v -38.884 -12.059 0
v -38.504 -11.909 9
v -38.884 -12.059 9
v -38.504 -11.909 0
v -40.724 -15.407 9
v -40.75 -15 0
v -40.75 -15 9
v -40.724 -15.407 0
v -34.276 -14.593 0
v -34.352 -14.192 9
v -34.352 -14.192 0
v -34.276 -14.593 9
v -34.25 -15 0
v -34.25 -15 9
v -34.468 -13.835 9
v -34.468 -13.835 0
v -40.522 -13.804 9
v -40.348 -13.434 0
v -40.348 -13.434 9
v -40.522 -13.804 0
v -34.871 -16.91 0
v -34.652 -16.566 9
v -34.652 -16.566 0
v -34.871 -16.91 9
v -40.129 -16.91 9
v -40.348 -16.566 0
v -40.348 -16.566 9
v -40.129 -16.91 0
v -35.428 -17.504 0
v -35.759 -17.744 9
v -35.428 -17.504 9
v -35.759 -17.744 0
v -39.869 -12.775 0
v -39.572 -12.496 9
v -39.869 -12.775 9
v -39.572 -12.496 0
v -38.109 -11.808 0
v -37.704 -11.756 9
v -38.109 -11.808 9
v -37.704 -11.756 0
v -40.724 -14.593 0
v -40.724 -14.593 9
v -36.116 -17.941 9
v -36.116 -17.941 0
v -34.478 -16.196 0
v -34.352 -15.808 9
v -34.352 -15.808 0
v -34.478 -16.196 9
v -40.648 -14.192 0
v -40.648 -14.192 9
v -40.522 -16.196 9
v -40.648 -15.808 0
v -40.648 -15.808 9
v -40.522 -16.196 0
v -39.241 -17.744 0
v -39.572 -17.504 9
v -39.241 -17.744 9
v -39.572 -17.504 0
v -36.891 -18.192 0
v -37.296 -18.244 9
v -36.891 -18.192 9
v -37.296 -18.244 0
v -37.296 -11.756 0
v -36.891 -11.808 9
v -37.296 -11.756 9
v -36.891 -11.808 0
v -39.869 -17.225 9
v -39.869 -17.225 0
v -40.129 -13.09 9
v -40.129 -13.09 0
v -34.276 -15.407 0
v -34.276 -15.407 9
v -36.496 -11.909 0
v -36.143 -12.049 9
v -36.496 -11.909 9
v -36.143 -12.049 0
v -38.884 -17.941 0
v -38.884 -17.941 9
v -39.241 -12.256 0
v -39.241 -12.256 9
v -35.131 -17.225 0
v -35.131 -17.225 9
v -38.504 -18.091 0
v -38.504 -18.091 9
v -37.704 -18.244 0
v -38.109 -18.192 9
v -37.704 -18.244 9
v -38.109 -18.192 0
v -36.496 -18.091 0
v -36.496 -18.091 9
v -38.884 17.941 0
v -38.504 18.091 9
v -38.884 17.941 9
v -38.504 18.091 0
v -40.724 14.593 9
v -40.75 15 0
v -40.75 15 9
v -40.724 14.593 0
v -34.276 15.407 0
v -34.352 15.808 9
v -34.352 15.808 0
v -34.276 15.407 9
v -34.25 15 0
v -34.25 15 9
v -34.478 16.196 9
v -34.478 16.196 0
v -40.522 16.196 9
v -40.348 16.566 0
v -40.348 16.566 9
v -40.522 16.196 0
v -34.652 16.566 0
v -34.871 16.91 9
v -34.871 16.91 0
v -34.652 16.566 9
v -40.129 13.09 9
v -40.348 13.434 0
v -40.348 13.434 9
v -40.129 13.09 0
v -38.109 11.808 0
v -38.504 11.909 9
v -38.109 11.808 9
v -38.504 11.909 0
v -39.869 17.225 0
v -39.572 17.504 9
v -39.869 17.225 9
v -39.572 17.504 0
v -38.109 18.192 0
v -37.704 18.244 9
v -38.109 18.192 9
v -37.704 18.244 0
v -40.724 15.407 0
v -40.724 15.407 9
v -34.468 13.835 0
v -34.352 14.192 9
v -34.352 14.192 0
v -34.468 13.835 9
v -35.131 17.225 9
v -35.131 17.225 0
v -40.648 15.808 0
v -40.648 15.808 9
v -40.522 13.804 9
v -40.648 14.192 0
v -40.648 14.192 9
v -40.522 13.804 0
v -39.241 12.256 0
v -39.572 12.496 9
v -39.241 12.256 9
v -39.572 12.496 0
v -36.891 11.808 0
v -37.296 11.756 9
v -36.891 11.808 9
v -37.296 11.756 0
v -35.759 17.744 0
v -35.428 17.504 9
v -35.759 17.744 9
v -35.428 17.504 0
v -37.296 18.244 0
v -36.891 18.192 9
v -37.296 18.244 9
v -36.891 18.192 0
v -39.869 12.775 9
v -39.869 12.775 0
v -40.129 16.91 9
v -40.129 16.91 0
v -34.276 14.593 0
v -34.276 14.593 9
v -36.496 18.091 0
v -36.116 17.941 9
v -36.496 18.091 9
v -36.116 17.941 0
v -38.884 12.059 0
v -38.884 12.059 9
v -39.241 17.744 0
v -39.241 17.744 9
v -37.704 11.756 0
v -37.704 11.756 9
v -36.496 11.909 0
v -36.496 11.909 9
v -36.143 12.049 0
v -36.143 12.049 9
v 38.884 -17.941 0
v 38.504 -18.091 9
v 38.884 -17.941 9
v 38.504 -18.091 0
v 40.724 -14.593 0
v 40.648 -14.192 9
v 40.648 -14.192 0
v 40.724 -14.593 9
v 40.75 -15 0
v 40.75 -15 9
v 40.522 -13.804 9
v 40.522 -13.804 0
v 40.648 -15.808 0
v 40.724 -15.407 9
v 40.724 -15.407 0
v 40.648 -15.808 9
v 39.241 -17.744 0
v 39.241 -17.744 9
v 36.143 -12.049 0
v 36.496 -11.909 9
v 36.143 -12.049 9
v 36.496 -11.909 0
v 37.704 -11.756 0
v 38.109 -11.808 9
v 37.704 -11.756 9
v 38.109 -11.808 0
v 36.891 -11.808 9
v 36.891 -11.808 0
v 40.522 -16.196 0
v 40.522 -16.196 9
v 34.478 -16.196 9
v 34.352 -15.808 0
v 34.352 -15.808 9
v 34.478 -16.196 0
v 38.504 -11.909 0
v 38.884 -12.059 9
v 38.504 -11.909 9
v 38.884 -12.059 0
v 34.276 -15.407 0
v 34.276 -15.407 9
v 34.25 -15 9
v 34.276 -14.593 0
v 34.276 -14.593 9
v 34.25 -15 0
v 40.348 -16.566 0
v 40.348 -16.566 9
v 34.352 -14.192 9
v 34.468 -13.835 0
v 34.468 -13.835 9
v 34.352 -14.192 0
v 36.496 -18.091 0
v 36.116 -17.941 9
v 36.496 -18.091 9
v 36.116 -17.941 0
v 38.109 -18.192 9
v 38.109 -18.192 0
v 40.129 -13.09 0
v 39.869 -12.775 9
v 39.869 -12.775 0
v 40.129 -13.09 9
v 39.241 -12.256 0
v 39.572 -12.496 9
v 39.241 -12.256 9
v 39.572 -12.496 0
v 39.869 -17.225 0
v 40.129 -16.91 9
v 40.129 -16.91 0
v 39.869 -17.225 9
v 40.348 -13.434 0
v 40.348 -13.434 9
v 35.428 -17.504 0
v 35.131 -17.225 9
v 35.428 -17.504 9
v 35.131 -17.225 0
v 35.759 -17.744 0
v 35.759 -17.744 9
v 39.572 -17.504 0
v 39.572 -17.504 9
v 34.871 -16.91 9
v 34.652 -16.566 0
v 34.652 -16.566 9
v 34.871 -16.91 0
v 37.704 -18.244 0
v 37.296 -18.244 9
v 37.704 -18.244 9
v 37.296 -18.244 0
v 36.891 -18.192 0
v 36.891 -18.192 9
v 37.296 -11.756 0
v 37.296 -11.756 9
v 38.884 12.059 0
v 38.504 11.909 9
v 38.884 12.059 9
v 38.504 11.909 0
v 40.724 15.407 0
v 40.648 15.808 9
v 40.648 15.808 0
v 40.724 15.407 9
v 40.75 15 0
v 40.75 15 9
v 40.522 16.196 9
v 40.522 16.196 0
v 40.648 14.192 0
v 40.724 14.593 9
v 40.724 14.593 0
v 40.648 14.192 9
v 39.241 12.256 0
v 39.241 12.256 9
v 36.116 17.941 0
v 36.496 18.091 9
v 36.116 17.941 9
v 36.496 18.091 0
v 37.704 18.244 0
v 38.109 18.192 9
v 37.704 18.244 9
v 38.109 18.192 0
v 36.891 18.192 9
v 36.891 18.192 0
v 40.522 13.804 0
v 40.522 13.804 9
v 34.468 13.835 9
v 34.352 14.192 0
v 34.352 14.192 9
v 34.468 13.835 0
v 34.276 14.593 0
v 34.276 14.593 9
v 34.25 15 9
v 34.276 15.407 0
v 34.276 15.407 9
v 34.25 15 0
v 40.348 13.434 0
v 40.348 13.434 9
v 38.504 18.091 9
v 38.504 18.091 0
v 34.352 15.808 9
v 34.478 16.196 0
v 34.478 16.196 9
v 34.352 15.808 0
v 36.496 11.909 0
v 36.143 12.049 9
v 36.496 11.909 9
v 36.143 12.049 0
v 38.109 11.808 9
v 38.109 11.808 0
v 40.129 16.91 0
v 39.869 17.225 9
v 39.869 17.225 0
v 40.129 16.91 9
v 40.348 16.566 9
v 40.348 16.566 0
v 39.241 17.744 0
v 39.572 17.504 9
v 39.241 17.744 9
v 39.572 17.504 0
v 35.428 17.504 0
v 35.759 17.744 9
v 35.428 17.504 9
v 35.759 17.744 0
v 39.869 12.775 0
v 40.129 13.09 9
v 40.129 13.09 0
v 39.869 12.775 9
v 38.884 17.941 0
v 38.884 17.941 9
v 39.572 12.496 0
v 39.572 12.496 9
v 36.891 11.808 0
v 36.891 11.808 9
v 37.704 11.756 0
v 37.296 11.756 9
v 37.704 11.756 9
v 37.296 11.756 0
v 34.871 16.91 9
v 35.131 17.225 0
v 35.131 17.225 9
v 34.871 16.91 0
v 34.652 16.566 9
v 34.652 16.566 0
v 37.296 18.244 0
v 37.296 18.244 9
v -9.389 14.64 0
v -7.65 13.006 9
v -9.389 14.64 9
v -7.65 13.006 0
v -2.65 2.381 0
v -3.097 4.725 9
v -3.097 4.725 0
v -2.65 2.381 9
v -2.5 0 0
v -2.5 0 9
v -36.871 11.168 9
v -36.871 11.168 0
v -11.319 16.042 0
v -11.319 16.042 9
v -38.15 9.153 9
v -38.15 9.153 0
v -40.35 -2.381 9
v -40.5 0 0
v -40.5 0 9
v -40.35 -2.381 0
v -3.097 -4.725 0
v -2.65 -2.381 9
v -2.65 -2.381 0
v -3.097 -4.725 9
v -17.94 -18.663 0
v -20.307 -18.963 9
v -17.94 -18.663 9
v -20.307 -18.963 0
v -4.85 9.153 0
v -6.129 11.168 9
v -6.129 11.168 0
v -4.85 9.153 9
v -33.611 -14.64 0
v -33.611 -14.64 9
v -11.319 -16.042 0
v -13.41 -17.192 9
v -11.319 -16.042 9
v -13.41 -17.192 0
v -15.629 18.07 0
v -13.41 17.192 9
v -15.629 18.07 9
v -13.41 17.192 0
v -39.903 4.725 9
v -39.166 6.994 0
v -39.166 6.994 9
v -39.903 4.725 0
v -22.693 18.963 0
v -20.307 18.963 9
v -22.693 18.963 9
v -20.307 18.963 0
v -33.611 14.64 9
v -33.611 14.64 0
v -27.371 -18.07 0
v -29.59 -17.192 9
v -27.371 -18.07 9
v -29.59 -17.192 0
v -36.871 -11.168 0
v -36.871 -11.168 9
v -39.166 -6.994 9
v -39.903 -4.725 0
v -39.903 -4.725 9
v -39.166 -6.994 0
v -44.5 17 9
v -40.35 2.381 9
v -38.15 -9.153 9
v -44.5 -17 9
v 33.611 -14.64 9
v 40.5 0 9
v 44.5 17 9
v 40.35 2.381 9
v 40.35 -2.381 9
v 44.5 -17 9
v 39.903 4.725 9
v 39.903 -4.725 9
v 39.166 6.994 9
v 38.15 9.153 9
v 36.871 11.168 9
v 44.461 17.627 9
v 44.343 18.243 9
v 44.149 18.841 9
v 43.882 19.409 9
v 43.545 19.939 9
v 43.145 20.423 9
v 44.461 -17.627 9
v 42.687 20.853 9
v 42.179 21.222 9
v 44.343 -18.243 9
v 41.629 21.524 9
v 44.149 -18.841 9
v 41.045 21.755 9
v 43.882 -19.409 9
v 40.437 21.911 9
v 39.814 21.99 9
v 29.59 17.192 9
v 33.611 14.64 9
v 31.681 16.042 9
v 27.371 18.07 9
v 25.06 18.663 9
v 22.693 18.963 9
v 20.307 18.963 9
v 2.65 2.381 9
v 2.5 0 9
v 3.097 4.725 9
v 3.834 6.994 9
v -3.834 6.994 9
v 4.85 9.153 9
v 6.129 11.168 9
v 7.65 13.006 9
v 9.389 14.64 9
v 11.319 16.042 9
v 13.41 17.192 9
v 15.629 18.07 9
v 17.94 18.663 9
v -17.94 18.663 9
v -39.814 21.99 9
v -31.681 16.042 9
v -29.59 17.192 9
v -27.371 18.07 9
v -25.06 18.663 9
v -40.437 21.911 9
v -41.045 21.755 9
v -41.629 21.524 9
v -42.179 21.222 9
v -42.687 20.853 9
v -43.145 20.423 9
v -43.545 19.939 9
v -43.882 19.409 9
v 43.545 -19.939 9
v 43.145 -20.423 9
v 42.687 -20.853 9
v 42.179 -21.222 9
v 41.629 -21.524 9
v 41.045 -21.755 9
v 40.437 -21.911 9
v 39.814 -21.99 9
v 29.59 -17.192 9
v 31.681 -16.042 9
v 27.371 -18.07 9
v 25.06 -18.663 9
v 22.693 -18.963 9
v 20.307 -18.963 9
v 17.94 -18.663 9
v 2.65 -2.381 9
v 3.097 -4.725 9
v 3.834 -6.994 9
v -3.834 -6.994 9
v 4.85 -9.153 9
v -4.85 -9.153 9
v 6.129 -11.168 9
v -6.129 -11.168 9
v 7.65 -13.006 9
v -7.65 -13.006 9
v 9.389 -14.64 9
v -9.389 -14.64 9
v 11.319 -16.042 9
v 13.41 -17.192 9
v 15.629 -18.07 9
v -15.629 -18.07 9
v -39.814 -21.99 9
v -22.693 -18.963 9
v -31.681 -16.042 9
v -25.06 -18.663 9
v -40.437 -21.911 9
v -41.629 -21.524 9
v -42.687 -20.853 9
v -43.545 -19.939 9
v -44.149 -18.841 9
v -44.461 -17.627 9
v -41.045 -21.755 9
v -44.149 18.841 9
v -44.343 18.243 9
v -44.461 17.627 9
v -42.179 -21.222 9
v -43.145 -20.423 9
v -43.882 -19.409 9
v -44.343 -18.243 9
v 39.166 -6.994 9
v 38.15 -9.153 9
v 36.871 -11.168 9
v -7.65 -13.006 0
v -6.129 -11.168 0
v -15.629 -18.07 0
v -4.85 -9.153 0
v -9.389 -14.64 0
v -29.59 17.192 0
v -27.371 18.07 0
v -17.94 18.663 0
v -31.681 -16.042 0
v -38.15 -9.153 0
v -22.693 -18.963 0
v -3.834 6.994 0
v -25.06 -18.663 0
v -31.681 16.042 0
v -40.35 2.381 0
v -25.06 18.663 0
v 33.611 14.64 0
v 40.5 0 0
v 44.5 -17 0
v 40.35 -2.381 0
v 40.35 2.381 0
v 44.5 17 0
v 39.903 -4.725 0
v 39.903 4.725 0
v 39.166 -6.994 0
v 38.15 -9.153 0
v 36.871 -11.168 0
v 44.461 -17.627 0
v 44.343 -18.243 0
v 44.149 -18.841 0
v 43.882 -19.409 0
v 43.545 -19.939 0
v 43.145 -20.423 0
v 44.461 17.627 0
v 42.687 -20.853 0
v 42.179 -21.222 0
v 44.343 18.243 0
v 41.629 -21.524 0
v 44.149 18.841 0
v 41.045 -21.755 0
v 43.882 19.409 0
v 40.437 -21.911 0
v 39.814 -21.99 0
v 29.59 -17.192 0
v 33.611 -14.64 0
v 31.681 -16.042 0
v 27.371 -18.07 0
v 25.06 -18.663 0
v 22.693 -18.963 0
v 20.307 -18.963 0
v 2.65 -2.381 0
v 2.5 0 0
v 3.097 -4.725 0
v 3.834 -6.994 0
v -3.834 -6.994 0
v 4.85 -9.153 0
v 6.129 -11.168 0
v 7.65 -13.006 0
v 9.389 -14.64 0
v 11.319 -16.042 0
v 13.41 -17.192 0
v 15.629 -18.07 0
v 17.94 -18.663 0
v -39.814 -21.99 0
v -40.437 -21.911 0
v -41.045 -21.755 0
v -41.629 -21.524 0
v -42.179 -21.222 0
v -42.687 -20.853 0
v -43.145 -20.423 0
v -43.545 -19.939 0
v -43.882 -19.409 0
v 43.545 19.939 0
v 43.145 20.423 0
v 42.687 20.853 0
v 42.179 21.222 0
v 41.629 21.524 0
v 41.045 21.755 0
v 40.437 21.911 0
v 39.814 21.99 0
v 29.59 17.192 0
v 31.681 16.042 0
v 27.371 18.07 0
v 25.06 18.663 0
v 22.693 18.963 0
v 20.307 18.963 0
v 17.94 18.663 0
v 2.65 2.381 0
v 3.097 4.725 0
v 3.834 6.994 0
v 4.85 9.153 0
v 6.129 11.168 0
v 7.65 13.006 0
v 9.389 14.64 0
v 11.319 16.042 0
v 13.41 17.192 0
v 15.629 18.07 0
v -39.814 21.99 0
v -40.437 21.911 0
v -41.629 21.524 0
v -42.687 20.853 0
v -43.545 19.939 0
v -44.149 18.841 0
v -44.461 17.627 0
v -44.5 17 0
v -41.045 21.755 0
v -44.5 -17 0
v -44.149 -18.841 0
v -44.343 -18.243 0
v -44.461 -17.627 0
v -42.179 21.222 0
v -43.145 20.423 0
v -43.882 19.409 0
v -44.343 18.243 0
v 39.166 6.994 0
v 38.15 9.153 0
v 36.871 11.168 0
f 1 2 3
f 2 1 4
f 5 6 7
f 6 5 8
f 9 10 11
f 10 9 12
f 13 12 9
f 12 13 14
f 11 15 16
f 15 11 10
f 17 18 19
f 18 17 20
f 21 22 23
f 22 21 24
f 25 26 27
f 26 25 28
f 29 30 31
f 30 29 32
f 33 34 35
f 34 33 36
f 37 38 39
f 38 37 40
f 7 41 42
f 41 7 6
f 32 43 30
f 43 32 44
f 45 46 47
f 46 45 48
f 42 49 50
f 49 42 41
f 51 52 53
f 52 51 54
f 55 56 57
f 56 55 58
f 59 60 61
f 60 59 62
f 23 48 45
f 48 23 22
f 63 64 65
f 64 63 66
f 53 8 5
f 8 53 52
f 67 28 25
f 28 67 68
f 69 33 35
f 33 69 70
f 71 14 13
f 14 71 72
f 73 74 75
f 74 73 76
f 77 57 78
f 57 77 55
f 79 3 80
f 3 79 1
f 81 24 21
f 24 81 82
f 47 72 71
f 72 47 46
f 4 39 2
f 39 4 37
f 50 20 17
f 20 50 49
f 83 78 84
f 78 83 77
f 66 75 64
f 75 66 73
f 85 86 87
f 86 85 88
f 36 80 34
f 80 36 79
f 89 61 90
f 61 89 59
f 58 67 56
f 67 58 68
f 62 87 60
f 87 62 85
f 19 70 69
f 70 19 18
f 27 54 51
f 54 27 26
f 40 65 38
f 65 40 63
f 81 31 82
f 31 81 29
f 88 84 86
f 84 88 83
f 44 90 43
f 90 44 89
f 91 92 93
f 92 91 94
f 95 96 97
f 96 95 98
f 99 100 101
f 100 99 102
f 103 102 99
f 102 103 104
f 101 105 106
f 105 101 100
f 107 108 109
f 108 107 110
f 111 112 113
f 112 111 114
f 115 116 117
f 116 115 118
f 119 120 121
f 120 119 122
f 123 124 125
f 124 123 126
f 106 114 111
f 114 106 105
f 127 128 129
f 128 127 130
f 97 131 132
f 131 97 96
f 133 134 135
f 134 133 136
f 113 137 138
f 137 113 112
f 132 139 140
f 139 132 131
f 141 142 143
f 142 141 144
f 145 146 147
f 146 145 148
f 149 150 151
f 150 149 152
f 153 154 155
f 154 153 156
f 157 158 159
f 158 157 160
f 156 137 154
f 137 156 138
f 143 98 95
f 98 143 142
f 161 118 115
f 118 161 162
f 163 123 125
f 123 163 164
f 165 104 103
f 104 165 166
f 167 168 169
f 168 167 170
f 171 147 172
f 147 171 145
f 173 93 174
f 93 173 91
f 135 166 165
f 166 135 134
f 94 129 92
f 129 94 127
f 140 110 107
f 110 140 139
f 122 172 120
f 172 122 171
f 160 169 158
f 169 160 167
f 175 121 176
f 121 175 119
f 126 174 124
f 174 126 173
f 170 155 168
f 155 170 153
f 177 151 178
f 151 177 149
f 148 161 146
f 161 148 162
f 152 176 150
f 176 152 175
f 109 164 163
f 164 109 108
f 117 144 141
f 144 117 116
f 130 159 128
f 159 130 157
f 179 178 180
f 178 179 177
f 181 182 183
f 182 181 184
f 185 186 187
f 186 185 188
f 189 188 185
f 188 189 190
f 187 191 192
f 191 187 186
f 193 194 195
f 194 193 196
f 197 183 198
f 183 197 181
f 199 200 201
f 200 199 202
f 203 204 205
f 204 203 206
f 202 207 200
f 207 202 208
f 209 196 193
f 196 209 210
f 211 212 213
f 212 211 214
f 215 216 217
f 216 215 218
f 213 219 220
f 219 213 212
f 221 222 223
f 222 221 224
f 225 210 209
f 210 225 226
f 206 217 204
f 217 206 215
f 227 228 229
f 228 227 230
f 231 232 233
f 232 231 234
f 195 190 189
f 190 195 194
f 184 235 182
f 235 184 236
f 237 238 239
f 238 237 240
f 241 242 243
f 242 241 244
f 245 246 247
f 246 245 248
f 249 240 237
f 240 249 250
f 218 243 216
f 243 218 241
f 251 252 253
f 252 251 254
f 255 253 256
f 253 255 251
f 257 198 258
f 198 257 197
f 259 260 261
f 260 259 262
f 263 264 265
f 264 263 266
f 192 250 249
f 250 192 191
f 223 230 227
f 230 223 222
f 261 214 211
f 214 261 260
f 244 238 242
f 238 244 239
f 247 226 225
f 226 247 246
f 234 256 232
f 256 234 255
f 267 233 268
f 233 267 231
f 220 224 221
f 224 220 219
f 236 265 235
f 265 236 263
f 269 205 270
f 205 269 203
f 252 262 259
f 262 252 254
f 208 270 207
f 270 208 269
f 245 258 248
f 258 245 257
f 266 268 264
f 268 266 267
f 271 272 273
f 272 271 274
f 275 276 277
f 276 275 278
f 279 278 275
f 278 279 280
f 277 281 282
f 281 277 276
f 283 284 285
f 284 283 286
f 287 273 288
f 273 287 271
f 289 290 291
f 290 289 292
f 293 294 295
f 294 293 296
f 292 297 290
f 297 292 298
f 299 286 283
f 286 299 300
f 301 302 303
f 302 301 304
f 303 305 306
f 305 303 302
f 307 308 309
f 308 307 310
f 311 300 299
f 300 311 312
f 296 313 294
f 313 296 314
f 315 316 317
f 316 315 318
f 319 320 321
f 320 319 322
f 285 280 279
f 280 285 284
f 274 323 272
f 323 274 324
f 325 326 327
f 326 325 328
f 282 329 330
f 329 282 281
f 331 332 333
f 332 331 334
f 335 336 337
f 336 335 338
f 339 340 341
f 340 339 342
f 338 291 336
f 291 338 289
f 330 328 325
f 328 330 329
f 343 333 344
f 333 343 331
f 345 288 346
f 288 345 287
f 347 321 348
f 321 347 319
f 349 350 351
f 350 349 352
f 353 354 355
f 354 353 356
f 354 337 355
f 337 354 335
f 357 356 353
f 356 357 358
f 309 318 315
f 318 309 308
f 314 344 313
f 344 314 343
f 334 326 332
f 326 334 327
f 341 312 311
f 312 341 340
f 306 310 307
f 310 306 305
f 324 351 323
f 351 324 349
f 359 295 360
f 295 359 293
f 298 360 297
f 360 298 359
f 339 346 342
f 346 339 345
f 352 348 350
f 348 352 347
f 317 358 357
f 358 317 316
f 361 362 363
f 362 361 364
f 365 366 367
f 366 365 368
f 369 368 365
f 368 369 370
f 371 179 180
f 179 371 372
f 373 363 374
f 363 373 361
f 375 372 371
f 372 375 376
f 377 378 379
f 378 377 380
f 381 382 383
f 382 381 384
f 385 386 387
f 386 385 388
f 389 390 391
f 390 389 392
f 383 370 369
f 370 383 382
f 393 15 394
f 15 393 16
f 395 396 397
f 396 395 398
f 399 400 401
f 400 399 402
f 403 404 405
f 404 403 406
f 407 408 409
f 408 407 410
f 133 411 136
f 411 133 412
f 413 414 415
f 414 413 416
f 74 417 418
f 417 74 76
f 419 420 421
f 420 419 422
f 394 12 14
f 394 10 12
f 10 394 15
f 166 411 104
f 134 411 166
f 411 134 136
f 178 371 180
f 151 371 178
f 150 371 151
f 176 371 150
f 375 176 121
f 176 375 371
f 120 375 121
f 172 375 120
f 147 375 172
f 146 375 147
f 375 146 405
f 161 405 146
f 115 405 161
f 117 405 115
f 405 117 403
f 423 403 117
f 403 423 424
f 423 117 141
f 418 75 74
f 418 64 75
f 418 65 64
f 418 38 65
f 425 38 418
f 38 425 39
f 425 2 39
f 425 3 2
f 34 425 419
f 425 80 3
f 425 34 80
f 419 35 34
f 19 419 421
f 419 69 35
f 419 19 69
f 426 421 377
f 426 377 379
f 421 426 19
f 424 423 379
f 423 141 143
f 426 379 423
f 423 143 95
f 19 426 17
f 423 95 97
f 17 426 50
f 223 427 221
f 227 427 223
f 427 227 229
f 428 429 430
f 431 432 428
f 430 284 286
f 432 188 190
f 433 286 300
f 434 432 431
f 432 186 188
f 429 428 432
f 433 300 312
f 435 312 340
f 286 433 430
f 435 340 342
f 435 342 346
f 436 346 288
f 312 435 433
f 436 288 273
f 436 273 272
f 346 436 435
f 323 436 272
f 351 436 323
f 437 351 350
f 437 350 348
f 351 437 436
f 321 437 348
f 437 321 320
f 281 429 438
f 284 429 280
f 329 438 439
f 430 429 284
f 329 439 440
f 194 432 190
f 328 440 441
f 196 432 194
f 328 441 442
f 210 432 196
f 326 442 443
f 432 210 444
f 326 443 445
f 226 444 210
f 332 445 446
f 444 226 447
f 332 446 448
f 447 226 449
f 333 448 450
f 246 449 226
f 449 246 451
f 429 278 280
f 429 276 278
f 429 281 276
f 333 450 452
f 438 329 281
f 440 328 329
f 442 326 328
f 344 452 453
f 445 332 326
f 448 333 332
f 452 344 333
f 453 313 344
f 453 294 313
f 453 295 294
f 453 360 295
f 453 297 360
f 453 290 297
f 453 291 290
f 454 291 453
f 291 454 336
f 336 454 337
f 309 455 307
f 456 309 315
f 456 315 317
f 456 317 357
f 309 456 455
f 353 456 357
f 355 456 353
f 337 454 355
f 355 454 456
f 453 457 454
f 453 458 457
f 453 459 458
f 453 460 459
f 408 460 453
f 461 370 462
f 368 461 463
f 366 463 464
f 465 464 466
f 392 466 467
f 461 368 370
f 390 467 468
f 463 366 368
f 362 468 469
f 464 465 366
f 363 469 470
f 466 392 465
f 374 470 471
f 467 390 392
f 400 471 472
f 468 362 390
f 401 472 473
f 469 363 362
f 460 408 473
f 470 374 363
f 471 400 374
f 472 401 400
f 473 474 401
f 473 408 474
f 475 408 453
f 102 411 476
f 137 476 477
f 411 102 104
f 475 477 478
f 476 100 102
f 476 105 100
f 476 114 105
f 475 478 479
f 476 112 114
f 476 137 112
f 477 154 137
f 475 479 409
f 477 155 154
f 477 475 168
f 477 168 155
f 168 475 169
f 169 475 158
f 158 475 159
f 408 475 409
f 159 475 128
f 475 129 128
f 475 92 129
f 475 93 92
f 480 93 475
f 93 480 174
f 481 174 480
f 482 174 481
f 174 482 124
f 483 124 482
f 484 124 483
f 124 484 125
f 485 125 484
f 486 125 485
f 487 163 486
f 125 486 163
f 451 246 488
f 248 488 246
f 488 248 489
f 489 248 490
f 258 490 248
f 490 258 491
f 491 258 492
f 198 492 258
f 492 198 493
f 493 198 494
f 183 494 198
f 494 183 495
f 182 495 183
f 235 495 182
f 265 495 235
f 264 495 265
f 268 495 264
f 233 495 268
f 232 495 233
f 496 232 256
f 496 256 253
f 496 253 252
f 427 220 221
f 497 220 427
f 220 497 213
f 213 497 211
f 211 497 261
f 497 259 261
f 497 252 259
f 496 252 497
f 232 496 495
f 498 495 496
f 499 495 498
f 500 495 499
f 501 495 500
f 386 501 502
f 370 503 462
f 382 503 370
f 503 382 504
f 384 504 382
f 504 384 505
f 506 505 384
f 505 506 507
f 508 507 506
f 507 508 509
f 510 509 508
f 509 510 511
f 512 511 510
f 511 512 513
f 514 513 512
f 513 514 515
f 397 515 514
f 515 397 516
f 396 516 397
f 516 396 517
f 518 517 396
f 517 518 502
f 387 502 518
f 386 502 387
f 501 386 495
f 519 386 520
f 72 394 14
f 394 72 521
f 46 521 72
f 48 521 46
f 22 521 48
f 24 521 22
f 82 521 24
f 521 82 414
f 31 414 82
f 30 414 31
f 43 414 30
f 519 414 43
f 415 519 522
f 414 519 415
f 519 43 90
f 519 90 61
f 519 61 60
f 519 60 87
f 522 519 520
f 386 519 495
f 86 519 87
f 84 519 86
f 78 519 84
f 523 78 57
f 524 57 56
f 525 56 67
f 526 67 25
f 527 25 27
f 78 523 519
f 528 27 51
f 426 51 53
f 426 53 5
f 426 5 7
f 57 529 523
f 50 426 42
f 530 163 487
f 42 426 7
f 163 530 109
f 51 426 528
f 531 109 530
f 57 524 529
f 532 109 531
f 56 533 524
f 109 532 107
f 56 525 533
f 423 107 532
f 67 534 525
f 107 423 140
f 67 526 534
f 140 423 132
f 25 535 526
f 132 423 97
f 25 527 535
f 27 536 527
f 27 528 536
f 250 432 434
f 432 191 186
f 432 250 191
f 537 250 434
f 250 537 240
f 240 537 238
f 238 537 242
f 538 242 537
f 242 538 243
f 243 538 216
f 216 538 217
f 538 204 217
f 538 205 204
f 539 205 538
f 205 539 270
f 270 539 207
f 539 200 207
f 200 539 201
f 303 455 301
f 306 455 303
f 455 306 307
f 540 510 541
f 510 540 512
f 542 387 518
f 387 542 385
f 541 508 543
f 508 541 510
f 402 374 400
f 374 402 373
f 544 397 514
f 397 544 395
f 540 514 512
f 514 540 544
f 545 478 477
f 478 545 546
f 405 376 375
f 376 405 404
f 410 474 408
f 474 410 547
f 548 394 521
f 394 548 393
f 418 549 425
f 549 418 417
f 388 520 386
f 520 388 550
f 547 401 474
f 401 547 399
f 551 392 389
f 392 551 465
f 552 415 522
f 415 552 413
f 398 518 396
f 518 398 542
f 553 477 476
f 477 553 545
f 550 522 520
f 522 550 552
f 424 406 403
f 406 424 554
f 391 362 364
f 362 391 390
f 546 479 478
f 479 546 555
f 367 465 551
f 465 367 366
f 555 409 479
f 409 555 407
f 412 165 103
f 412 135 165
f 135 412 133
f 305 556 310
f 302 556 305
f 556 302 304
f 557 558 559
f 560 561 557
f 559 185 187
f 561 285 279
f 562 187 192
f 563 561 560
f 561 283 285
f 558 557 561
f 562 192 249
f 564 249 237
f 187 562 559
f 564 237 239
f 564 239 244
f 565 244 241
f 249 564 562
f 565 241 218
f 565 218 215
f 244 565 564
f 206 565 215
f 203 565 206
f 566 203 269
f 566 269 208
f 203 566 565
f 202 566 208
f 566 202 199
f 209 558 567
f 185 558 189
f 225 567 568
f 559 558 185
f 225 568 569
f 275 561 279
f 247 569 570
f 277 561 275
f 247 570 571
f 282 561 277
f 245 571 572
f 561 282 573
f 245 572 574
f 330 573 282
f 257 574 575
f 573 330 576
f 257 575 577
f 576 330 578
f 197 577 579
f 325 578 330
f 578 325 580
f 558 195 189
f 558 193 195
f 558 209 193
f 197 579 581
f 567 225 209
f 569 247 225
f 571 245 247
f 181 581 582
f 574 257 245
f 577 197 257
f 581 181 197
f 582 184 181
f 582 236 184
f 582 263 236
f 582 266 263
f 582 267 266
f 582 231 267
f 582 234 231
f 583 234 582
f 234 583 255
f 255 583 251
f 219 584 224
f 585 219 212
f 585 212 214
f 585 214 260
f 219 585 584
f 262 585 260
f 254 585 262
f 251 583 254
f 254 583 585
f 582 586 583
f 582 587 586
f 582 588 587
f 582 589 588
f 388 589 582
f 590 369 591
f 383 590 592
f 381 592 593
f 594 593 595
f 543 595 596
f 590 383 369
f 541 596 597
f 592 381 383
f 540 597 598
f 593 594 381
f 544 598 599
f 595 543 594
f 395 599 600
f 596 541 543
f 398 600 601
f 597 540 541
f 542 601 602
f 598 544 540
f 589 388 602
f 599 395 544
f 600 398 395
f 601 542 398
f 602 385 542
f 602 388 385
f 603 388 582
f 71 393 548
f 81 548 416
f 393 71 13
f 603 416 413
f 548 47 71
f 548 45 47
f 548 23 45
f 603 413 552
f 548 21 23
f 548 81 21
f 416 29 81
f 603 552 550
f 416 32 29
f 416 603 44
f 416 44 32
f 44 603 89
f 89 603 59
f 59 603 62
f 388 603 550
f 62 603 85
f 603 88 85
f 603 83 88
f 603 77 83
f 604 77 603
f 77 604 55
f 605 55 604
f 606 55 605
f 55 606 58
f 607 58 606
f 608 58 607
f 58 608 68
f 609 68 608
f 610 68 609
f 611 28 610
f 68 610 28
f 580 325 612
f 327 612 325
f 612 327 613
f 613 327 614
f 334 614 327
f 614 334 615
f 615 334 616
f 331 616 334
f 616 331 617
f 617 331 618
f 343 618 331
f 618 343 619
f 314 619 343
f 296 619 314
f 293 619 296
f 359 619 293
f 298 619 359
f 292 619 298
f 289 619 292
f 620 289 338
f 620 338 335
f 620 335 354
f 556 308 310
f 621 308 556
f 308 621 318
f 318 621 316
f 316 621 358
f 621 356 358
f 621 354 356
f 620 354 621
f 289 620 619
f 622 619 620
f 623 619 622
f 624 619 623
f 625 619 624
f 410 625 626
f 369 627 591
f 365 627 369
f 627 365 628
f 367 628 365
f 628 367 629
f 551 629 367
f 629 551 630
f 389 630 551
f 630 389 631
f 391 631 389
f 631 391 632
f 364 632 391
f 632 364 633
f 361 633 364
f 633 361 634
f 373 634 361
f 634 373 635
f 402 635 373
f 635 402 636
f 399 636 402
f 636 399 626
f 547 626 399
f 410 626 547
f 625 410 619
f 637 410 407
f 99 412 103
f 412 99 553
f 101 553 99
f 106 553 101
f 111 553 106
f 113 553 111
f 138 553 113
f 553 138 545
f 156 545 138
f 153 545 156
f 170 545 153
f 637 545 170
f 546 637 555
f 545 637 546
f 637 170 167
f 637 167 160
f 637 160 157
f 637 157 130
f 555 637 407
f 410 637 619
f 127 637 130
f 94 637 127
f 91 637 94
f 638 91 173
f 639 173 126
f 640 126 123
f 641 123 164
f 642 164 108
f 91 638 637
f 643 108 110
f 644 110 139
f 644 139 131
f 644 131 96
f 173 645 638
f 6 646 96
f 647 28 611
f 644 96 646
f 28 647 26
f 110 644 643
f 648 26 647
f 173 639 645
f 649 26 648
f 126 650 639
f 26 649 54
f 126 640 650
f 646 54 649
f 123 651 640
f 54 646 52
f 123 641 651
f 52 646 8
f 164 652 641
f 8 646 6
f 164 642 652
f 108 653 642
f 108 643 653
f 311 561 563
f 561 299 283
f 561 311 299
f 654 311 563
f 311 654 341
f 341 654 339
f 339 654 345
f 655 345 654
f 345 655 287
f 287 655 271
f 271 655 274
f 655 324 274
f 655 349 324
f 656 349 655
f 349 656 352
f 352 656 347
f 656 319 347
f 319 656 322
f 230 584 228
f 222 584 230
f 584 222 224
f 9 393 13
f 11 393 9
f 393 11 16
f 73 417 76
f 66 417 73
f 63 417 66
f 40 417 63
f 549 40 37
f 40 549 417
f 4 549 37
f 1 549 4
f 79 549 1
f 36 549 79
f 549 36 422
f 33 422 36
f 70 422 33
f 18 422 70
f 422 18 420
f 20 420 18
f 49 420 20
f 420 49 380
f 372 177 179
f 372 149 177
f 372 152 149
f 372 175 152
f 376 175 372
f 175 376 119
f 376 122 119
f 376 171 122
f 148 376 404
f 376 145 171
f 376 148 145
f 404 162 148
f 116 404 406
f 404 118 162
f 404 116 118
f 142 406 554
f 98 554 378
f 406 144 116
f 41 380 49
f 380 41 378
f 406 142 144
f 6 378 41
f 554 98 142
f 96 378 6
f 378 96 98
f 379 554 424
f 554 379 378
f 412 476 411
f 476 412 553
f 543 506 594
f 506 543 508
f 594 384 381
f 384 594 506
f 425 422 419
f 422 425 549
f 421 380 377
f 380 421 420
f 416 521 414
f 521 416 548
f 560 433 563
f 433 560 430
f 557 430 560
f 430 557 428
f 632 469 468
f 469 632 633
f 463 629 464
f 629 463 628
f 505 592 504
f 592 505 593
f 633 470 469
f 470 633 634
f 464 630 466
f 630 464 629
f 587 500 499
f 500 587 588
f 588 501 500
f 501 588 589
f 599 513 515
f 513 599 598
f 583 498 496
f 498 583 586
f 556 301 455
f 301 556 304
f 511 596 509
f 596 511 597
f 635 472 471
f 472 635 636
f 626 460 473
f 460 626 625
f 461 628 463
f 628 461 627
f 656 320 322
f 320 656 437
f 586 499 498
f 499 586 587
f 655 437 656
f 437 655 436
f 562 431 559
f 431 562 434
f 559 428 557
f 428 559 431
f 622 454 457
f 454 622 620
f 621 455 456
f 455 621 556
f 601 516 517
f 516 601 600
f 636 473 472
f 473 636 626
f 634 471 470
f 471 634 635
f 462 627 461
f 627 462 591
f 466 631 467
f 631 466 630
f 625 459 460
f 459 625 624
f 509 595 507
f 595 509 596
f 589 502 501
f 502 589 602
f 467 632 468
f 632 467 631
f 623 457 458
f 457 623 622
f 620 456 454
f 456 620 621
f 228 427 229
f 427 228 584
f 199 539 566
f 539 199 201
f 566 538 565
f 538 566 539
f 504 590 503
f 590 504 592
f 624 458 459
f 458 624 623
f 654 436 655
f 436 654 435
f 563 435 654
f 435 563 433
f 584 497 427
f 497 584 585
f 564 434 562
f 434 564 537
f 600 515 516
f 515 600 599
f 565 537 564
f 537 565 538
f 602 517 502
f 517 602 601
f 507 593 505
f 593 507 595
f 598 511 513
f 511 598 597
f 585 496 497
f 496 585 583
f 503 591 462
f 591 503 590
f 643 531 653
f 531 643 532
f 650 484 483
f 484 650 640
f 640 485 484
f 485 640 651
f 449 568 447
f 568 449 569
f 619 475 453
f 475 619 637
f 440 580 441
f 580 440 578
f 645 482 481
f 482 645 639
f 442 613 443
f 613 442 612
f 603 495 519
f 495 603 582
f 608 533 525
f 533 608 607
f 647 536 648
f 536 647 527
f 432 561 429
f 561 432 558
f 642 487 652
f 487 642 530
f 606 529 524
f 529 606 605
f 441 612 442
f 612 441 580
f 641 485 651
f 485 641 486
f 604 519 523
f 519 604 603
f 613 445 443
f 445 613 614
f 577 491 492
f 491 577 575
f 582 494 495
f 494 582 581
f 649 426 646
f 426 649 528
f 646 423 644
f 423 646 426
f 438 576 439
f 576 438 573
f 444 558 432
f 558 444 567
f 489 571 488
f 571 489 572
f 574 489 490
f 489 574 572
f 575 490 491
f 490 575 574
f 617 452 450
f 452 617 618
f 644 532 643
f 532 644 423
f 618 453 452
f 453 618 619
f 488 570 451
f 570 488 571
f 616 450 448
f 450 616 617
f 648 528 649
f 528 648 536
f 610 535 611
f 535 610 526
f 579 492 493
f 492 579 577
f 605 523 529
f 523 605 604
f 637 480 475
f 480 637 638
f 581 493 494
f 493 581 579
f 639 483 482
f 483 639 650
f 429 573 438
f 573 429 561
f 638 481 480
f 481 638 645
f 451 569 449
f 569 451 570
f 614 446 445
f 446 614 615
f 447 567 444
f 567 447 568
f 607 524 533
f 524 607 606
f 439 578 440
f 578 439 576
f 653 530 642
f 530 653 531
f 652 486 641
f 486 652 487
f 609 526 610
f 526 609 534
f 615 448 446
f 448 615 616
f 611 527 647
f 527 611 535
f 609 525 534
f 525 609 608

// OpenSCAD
$fn = 50;

difference() {
	union() {
		hull() {
			translate(v = [-39.5, 17.0, 0]) {
				cylinder(h = 9, r = 5);
			}
			translate(v = [39.5, 17.0, 0]) {
				cylinder(h = 9, r = 5);
			}
			translate(v = [-39.5, -17.0, 0]) {
				cylinder(h = 9, r = 5);
			}
			translate(v = [39.5, -17.0, 0]) {
				cylinder(h = 9, r = 5);
			}
		}
	}
	union() {
		translate(v = [-37.5, -15.0, -100.0]) {
			cylinder(h = 200, r = 3.25);
		}
		translate(v = [-37.5, 15.0, -100.0]) {
			cylinder(h = 200, r = 3.25);
		}
		translate(v = [37.5, -15.0, -100.0]) {
			cylinder(h = 200, r = 3.25);
		}
		translate(v = [37.5, 15.0, -100.0]) {
			cylinder(h = 200, r = 3.25);
		}
		translate(v = [-37.5, -15.0, -100.0]) {
			cylinder(h = 200, r = 1.8);
		}
		translate(v = [-37.5, 15.0, -100.0]) {
			cylinder(h = 200, r = 1.8);
		}
		translate(v = [37.5, -15.0, -100.0]) {
			cylinder(h = 200, r = 1.8);
		}
		translate(v = [37.5, 15.0, -100.0]) {
			cylinder(h = 200, r = 1.8);
		}
		translate(v = [-21.5, 0, 0.0]) {
			cylinder(h = 9, r = 19.0);
		}
		translate(v = [21.5, 0, 0.0]) {
			cylinder(h = 9, r = 19.0);
		}
	}
}
